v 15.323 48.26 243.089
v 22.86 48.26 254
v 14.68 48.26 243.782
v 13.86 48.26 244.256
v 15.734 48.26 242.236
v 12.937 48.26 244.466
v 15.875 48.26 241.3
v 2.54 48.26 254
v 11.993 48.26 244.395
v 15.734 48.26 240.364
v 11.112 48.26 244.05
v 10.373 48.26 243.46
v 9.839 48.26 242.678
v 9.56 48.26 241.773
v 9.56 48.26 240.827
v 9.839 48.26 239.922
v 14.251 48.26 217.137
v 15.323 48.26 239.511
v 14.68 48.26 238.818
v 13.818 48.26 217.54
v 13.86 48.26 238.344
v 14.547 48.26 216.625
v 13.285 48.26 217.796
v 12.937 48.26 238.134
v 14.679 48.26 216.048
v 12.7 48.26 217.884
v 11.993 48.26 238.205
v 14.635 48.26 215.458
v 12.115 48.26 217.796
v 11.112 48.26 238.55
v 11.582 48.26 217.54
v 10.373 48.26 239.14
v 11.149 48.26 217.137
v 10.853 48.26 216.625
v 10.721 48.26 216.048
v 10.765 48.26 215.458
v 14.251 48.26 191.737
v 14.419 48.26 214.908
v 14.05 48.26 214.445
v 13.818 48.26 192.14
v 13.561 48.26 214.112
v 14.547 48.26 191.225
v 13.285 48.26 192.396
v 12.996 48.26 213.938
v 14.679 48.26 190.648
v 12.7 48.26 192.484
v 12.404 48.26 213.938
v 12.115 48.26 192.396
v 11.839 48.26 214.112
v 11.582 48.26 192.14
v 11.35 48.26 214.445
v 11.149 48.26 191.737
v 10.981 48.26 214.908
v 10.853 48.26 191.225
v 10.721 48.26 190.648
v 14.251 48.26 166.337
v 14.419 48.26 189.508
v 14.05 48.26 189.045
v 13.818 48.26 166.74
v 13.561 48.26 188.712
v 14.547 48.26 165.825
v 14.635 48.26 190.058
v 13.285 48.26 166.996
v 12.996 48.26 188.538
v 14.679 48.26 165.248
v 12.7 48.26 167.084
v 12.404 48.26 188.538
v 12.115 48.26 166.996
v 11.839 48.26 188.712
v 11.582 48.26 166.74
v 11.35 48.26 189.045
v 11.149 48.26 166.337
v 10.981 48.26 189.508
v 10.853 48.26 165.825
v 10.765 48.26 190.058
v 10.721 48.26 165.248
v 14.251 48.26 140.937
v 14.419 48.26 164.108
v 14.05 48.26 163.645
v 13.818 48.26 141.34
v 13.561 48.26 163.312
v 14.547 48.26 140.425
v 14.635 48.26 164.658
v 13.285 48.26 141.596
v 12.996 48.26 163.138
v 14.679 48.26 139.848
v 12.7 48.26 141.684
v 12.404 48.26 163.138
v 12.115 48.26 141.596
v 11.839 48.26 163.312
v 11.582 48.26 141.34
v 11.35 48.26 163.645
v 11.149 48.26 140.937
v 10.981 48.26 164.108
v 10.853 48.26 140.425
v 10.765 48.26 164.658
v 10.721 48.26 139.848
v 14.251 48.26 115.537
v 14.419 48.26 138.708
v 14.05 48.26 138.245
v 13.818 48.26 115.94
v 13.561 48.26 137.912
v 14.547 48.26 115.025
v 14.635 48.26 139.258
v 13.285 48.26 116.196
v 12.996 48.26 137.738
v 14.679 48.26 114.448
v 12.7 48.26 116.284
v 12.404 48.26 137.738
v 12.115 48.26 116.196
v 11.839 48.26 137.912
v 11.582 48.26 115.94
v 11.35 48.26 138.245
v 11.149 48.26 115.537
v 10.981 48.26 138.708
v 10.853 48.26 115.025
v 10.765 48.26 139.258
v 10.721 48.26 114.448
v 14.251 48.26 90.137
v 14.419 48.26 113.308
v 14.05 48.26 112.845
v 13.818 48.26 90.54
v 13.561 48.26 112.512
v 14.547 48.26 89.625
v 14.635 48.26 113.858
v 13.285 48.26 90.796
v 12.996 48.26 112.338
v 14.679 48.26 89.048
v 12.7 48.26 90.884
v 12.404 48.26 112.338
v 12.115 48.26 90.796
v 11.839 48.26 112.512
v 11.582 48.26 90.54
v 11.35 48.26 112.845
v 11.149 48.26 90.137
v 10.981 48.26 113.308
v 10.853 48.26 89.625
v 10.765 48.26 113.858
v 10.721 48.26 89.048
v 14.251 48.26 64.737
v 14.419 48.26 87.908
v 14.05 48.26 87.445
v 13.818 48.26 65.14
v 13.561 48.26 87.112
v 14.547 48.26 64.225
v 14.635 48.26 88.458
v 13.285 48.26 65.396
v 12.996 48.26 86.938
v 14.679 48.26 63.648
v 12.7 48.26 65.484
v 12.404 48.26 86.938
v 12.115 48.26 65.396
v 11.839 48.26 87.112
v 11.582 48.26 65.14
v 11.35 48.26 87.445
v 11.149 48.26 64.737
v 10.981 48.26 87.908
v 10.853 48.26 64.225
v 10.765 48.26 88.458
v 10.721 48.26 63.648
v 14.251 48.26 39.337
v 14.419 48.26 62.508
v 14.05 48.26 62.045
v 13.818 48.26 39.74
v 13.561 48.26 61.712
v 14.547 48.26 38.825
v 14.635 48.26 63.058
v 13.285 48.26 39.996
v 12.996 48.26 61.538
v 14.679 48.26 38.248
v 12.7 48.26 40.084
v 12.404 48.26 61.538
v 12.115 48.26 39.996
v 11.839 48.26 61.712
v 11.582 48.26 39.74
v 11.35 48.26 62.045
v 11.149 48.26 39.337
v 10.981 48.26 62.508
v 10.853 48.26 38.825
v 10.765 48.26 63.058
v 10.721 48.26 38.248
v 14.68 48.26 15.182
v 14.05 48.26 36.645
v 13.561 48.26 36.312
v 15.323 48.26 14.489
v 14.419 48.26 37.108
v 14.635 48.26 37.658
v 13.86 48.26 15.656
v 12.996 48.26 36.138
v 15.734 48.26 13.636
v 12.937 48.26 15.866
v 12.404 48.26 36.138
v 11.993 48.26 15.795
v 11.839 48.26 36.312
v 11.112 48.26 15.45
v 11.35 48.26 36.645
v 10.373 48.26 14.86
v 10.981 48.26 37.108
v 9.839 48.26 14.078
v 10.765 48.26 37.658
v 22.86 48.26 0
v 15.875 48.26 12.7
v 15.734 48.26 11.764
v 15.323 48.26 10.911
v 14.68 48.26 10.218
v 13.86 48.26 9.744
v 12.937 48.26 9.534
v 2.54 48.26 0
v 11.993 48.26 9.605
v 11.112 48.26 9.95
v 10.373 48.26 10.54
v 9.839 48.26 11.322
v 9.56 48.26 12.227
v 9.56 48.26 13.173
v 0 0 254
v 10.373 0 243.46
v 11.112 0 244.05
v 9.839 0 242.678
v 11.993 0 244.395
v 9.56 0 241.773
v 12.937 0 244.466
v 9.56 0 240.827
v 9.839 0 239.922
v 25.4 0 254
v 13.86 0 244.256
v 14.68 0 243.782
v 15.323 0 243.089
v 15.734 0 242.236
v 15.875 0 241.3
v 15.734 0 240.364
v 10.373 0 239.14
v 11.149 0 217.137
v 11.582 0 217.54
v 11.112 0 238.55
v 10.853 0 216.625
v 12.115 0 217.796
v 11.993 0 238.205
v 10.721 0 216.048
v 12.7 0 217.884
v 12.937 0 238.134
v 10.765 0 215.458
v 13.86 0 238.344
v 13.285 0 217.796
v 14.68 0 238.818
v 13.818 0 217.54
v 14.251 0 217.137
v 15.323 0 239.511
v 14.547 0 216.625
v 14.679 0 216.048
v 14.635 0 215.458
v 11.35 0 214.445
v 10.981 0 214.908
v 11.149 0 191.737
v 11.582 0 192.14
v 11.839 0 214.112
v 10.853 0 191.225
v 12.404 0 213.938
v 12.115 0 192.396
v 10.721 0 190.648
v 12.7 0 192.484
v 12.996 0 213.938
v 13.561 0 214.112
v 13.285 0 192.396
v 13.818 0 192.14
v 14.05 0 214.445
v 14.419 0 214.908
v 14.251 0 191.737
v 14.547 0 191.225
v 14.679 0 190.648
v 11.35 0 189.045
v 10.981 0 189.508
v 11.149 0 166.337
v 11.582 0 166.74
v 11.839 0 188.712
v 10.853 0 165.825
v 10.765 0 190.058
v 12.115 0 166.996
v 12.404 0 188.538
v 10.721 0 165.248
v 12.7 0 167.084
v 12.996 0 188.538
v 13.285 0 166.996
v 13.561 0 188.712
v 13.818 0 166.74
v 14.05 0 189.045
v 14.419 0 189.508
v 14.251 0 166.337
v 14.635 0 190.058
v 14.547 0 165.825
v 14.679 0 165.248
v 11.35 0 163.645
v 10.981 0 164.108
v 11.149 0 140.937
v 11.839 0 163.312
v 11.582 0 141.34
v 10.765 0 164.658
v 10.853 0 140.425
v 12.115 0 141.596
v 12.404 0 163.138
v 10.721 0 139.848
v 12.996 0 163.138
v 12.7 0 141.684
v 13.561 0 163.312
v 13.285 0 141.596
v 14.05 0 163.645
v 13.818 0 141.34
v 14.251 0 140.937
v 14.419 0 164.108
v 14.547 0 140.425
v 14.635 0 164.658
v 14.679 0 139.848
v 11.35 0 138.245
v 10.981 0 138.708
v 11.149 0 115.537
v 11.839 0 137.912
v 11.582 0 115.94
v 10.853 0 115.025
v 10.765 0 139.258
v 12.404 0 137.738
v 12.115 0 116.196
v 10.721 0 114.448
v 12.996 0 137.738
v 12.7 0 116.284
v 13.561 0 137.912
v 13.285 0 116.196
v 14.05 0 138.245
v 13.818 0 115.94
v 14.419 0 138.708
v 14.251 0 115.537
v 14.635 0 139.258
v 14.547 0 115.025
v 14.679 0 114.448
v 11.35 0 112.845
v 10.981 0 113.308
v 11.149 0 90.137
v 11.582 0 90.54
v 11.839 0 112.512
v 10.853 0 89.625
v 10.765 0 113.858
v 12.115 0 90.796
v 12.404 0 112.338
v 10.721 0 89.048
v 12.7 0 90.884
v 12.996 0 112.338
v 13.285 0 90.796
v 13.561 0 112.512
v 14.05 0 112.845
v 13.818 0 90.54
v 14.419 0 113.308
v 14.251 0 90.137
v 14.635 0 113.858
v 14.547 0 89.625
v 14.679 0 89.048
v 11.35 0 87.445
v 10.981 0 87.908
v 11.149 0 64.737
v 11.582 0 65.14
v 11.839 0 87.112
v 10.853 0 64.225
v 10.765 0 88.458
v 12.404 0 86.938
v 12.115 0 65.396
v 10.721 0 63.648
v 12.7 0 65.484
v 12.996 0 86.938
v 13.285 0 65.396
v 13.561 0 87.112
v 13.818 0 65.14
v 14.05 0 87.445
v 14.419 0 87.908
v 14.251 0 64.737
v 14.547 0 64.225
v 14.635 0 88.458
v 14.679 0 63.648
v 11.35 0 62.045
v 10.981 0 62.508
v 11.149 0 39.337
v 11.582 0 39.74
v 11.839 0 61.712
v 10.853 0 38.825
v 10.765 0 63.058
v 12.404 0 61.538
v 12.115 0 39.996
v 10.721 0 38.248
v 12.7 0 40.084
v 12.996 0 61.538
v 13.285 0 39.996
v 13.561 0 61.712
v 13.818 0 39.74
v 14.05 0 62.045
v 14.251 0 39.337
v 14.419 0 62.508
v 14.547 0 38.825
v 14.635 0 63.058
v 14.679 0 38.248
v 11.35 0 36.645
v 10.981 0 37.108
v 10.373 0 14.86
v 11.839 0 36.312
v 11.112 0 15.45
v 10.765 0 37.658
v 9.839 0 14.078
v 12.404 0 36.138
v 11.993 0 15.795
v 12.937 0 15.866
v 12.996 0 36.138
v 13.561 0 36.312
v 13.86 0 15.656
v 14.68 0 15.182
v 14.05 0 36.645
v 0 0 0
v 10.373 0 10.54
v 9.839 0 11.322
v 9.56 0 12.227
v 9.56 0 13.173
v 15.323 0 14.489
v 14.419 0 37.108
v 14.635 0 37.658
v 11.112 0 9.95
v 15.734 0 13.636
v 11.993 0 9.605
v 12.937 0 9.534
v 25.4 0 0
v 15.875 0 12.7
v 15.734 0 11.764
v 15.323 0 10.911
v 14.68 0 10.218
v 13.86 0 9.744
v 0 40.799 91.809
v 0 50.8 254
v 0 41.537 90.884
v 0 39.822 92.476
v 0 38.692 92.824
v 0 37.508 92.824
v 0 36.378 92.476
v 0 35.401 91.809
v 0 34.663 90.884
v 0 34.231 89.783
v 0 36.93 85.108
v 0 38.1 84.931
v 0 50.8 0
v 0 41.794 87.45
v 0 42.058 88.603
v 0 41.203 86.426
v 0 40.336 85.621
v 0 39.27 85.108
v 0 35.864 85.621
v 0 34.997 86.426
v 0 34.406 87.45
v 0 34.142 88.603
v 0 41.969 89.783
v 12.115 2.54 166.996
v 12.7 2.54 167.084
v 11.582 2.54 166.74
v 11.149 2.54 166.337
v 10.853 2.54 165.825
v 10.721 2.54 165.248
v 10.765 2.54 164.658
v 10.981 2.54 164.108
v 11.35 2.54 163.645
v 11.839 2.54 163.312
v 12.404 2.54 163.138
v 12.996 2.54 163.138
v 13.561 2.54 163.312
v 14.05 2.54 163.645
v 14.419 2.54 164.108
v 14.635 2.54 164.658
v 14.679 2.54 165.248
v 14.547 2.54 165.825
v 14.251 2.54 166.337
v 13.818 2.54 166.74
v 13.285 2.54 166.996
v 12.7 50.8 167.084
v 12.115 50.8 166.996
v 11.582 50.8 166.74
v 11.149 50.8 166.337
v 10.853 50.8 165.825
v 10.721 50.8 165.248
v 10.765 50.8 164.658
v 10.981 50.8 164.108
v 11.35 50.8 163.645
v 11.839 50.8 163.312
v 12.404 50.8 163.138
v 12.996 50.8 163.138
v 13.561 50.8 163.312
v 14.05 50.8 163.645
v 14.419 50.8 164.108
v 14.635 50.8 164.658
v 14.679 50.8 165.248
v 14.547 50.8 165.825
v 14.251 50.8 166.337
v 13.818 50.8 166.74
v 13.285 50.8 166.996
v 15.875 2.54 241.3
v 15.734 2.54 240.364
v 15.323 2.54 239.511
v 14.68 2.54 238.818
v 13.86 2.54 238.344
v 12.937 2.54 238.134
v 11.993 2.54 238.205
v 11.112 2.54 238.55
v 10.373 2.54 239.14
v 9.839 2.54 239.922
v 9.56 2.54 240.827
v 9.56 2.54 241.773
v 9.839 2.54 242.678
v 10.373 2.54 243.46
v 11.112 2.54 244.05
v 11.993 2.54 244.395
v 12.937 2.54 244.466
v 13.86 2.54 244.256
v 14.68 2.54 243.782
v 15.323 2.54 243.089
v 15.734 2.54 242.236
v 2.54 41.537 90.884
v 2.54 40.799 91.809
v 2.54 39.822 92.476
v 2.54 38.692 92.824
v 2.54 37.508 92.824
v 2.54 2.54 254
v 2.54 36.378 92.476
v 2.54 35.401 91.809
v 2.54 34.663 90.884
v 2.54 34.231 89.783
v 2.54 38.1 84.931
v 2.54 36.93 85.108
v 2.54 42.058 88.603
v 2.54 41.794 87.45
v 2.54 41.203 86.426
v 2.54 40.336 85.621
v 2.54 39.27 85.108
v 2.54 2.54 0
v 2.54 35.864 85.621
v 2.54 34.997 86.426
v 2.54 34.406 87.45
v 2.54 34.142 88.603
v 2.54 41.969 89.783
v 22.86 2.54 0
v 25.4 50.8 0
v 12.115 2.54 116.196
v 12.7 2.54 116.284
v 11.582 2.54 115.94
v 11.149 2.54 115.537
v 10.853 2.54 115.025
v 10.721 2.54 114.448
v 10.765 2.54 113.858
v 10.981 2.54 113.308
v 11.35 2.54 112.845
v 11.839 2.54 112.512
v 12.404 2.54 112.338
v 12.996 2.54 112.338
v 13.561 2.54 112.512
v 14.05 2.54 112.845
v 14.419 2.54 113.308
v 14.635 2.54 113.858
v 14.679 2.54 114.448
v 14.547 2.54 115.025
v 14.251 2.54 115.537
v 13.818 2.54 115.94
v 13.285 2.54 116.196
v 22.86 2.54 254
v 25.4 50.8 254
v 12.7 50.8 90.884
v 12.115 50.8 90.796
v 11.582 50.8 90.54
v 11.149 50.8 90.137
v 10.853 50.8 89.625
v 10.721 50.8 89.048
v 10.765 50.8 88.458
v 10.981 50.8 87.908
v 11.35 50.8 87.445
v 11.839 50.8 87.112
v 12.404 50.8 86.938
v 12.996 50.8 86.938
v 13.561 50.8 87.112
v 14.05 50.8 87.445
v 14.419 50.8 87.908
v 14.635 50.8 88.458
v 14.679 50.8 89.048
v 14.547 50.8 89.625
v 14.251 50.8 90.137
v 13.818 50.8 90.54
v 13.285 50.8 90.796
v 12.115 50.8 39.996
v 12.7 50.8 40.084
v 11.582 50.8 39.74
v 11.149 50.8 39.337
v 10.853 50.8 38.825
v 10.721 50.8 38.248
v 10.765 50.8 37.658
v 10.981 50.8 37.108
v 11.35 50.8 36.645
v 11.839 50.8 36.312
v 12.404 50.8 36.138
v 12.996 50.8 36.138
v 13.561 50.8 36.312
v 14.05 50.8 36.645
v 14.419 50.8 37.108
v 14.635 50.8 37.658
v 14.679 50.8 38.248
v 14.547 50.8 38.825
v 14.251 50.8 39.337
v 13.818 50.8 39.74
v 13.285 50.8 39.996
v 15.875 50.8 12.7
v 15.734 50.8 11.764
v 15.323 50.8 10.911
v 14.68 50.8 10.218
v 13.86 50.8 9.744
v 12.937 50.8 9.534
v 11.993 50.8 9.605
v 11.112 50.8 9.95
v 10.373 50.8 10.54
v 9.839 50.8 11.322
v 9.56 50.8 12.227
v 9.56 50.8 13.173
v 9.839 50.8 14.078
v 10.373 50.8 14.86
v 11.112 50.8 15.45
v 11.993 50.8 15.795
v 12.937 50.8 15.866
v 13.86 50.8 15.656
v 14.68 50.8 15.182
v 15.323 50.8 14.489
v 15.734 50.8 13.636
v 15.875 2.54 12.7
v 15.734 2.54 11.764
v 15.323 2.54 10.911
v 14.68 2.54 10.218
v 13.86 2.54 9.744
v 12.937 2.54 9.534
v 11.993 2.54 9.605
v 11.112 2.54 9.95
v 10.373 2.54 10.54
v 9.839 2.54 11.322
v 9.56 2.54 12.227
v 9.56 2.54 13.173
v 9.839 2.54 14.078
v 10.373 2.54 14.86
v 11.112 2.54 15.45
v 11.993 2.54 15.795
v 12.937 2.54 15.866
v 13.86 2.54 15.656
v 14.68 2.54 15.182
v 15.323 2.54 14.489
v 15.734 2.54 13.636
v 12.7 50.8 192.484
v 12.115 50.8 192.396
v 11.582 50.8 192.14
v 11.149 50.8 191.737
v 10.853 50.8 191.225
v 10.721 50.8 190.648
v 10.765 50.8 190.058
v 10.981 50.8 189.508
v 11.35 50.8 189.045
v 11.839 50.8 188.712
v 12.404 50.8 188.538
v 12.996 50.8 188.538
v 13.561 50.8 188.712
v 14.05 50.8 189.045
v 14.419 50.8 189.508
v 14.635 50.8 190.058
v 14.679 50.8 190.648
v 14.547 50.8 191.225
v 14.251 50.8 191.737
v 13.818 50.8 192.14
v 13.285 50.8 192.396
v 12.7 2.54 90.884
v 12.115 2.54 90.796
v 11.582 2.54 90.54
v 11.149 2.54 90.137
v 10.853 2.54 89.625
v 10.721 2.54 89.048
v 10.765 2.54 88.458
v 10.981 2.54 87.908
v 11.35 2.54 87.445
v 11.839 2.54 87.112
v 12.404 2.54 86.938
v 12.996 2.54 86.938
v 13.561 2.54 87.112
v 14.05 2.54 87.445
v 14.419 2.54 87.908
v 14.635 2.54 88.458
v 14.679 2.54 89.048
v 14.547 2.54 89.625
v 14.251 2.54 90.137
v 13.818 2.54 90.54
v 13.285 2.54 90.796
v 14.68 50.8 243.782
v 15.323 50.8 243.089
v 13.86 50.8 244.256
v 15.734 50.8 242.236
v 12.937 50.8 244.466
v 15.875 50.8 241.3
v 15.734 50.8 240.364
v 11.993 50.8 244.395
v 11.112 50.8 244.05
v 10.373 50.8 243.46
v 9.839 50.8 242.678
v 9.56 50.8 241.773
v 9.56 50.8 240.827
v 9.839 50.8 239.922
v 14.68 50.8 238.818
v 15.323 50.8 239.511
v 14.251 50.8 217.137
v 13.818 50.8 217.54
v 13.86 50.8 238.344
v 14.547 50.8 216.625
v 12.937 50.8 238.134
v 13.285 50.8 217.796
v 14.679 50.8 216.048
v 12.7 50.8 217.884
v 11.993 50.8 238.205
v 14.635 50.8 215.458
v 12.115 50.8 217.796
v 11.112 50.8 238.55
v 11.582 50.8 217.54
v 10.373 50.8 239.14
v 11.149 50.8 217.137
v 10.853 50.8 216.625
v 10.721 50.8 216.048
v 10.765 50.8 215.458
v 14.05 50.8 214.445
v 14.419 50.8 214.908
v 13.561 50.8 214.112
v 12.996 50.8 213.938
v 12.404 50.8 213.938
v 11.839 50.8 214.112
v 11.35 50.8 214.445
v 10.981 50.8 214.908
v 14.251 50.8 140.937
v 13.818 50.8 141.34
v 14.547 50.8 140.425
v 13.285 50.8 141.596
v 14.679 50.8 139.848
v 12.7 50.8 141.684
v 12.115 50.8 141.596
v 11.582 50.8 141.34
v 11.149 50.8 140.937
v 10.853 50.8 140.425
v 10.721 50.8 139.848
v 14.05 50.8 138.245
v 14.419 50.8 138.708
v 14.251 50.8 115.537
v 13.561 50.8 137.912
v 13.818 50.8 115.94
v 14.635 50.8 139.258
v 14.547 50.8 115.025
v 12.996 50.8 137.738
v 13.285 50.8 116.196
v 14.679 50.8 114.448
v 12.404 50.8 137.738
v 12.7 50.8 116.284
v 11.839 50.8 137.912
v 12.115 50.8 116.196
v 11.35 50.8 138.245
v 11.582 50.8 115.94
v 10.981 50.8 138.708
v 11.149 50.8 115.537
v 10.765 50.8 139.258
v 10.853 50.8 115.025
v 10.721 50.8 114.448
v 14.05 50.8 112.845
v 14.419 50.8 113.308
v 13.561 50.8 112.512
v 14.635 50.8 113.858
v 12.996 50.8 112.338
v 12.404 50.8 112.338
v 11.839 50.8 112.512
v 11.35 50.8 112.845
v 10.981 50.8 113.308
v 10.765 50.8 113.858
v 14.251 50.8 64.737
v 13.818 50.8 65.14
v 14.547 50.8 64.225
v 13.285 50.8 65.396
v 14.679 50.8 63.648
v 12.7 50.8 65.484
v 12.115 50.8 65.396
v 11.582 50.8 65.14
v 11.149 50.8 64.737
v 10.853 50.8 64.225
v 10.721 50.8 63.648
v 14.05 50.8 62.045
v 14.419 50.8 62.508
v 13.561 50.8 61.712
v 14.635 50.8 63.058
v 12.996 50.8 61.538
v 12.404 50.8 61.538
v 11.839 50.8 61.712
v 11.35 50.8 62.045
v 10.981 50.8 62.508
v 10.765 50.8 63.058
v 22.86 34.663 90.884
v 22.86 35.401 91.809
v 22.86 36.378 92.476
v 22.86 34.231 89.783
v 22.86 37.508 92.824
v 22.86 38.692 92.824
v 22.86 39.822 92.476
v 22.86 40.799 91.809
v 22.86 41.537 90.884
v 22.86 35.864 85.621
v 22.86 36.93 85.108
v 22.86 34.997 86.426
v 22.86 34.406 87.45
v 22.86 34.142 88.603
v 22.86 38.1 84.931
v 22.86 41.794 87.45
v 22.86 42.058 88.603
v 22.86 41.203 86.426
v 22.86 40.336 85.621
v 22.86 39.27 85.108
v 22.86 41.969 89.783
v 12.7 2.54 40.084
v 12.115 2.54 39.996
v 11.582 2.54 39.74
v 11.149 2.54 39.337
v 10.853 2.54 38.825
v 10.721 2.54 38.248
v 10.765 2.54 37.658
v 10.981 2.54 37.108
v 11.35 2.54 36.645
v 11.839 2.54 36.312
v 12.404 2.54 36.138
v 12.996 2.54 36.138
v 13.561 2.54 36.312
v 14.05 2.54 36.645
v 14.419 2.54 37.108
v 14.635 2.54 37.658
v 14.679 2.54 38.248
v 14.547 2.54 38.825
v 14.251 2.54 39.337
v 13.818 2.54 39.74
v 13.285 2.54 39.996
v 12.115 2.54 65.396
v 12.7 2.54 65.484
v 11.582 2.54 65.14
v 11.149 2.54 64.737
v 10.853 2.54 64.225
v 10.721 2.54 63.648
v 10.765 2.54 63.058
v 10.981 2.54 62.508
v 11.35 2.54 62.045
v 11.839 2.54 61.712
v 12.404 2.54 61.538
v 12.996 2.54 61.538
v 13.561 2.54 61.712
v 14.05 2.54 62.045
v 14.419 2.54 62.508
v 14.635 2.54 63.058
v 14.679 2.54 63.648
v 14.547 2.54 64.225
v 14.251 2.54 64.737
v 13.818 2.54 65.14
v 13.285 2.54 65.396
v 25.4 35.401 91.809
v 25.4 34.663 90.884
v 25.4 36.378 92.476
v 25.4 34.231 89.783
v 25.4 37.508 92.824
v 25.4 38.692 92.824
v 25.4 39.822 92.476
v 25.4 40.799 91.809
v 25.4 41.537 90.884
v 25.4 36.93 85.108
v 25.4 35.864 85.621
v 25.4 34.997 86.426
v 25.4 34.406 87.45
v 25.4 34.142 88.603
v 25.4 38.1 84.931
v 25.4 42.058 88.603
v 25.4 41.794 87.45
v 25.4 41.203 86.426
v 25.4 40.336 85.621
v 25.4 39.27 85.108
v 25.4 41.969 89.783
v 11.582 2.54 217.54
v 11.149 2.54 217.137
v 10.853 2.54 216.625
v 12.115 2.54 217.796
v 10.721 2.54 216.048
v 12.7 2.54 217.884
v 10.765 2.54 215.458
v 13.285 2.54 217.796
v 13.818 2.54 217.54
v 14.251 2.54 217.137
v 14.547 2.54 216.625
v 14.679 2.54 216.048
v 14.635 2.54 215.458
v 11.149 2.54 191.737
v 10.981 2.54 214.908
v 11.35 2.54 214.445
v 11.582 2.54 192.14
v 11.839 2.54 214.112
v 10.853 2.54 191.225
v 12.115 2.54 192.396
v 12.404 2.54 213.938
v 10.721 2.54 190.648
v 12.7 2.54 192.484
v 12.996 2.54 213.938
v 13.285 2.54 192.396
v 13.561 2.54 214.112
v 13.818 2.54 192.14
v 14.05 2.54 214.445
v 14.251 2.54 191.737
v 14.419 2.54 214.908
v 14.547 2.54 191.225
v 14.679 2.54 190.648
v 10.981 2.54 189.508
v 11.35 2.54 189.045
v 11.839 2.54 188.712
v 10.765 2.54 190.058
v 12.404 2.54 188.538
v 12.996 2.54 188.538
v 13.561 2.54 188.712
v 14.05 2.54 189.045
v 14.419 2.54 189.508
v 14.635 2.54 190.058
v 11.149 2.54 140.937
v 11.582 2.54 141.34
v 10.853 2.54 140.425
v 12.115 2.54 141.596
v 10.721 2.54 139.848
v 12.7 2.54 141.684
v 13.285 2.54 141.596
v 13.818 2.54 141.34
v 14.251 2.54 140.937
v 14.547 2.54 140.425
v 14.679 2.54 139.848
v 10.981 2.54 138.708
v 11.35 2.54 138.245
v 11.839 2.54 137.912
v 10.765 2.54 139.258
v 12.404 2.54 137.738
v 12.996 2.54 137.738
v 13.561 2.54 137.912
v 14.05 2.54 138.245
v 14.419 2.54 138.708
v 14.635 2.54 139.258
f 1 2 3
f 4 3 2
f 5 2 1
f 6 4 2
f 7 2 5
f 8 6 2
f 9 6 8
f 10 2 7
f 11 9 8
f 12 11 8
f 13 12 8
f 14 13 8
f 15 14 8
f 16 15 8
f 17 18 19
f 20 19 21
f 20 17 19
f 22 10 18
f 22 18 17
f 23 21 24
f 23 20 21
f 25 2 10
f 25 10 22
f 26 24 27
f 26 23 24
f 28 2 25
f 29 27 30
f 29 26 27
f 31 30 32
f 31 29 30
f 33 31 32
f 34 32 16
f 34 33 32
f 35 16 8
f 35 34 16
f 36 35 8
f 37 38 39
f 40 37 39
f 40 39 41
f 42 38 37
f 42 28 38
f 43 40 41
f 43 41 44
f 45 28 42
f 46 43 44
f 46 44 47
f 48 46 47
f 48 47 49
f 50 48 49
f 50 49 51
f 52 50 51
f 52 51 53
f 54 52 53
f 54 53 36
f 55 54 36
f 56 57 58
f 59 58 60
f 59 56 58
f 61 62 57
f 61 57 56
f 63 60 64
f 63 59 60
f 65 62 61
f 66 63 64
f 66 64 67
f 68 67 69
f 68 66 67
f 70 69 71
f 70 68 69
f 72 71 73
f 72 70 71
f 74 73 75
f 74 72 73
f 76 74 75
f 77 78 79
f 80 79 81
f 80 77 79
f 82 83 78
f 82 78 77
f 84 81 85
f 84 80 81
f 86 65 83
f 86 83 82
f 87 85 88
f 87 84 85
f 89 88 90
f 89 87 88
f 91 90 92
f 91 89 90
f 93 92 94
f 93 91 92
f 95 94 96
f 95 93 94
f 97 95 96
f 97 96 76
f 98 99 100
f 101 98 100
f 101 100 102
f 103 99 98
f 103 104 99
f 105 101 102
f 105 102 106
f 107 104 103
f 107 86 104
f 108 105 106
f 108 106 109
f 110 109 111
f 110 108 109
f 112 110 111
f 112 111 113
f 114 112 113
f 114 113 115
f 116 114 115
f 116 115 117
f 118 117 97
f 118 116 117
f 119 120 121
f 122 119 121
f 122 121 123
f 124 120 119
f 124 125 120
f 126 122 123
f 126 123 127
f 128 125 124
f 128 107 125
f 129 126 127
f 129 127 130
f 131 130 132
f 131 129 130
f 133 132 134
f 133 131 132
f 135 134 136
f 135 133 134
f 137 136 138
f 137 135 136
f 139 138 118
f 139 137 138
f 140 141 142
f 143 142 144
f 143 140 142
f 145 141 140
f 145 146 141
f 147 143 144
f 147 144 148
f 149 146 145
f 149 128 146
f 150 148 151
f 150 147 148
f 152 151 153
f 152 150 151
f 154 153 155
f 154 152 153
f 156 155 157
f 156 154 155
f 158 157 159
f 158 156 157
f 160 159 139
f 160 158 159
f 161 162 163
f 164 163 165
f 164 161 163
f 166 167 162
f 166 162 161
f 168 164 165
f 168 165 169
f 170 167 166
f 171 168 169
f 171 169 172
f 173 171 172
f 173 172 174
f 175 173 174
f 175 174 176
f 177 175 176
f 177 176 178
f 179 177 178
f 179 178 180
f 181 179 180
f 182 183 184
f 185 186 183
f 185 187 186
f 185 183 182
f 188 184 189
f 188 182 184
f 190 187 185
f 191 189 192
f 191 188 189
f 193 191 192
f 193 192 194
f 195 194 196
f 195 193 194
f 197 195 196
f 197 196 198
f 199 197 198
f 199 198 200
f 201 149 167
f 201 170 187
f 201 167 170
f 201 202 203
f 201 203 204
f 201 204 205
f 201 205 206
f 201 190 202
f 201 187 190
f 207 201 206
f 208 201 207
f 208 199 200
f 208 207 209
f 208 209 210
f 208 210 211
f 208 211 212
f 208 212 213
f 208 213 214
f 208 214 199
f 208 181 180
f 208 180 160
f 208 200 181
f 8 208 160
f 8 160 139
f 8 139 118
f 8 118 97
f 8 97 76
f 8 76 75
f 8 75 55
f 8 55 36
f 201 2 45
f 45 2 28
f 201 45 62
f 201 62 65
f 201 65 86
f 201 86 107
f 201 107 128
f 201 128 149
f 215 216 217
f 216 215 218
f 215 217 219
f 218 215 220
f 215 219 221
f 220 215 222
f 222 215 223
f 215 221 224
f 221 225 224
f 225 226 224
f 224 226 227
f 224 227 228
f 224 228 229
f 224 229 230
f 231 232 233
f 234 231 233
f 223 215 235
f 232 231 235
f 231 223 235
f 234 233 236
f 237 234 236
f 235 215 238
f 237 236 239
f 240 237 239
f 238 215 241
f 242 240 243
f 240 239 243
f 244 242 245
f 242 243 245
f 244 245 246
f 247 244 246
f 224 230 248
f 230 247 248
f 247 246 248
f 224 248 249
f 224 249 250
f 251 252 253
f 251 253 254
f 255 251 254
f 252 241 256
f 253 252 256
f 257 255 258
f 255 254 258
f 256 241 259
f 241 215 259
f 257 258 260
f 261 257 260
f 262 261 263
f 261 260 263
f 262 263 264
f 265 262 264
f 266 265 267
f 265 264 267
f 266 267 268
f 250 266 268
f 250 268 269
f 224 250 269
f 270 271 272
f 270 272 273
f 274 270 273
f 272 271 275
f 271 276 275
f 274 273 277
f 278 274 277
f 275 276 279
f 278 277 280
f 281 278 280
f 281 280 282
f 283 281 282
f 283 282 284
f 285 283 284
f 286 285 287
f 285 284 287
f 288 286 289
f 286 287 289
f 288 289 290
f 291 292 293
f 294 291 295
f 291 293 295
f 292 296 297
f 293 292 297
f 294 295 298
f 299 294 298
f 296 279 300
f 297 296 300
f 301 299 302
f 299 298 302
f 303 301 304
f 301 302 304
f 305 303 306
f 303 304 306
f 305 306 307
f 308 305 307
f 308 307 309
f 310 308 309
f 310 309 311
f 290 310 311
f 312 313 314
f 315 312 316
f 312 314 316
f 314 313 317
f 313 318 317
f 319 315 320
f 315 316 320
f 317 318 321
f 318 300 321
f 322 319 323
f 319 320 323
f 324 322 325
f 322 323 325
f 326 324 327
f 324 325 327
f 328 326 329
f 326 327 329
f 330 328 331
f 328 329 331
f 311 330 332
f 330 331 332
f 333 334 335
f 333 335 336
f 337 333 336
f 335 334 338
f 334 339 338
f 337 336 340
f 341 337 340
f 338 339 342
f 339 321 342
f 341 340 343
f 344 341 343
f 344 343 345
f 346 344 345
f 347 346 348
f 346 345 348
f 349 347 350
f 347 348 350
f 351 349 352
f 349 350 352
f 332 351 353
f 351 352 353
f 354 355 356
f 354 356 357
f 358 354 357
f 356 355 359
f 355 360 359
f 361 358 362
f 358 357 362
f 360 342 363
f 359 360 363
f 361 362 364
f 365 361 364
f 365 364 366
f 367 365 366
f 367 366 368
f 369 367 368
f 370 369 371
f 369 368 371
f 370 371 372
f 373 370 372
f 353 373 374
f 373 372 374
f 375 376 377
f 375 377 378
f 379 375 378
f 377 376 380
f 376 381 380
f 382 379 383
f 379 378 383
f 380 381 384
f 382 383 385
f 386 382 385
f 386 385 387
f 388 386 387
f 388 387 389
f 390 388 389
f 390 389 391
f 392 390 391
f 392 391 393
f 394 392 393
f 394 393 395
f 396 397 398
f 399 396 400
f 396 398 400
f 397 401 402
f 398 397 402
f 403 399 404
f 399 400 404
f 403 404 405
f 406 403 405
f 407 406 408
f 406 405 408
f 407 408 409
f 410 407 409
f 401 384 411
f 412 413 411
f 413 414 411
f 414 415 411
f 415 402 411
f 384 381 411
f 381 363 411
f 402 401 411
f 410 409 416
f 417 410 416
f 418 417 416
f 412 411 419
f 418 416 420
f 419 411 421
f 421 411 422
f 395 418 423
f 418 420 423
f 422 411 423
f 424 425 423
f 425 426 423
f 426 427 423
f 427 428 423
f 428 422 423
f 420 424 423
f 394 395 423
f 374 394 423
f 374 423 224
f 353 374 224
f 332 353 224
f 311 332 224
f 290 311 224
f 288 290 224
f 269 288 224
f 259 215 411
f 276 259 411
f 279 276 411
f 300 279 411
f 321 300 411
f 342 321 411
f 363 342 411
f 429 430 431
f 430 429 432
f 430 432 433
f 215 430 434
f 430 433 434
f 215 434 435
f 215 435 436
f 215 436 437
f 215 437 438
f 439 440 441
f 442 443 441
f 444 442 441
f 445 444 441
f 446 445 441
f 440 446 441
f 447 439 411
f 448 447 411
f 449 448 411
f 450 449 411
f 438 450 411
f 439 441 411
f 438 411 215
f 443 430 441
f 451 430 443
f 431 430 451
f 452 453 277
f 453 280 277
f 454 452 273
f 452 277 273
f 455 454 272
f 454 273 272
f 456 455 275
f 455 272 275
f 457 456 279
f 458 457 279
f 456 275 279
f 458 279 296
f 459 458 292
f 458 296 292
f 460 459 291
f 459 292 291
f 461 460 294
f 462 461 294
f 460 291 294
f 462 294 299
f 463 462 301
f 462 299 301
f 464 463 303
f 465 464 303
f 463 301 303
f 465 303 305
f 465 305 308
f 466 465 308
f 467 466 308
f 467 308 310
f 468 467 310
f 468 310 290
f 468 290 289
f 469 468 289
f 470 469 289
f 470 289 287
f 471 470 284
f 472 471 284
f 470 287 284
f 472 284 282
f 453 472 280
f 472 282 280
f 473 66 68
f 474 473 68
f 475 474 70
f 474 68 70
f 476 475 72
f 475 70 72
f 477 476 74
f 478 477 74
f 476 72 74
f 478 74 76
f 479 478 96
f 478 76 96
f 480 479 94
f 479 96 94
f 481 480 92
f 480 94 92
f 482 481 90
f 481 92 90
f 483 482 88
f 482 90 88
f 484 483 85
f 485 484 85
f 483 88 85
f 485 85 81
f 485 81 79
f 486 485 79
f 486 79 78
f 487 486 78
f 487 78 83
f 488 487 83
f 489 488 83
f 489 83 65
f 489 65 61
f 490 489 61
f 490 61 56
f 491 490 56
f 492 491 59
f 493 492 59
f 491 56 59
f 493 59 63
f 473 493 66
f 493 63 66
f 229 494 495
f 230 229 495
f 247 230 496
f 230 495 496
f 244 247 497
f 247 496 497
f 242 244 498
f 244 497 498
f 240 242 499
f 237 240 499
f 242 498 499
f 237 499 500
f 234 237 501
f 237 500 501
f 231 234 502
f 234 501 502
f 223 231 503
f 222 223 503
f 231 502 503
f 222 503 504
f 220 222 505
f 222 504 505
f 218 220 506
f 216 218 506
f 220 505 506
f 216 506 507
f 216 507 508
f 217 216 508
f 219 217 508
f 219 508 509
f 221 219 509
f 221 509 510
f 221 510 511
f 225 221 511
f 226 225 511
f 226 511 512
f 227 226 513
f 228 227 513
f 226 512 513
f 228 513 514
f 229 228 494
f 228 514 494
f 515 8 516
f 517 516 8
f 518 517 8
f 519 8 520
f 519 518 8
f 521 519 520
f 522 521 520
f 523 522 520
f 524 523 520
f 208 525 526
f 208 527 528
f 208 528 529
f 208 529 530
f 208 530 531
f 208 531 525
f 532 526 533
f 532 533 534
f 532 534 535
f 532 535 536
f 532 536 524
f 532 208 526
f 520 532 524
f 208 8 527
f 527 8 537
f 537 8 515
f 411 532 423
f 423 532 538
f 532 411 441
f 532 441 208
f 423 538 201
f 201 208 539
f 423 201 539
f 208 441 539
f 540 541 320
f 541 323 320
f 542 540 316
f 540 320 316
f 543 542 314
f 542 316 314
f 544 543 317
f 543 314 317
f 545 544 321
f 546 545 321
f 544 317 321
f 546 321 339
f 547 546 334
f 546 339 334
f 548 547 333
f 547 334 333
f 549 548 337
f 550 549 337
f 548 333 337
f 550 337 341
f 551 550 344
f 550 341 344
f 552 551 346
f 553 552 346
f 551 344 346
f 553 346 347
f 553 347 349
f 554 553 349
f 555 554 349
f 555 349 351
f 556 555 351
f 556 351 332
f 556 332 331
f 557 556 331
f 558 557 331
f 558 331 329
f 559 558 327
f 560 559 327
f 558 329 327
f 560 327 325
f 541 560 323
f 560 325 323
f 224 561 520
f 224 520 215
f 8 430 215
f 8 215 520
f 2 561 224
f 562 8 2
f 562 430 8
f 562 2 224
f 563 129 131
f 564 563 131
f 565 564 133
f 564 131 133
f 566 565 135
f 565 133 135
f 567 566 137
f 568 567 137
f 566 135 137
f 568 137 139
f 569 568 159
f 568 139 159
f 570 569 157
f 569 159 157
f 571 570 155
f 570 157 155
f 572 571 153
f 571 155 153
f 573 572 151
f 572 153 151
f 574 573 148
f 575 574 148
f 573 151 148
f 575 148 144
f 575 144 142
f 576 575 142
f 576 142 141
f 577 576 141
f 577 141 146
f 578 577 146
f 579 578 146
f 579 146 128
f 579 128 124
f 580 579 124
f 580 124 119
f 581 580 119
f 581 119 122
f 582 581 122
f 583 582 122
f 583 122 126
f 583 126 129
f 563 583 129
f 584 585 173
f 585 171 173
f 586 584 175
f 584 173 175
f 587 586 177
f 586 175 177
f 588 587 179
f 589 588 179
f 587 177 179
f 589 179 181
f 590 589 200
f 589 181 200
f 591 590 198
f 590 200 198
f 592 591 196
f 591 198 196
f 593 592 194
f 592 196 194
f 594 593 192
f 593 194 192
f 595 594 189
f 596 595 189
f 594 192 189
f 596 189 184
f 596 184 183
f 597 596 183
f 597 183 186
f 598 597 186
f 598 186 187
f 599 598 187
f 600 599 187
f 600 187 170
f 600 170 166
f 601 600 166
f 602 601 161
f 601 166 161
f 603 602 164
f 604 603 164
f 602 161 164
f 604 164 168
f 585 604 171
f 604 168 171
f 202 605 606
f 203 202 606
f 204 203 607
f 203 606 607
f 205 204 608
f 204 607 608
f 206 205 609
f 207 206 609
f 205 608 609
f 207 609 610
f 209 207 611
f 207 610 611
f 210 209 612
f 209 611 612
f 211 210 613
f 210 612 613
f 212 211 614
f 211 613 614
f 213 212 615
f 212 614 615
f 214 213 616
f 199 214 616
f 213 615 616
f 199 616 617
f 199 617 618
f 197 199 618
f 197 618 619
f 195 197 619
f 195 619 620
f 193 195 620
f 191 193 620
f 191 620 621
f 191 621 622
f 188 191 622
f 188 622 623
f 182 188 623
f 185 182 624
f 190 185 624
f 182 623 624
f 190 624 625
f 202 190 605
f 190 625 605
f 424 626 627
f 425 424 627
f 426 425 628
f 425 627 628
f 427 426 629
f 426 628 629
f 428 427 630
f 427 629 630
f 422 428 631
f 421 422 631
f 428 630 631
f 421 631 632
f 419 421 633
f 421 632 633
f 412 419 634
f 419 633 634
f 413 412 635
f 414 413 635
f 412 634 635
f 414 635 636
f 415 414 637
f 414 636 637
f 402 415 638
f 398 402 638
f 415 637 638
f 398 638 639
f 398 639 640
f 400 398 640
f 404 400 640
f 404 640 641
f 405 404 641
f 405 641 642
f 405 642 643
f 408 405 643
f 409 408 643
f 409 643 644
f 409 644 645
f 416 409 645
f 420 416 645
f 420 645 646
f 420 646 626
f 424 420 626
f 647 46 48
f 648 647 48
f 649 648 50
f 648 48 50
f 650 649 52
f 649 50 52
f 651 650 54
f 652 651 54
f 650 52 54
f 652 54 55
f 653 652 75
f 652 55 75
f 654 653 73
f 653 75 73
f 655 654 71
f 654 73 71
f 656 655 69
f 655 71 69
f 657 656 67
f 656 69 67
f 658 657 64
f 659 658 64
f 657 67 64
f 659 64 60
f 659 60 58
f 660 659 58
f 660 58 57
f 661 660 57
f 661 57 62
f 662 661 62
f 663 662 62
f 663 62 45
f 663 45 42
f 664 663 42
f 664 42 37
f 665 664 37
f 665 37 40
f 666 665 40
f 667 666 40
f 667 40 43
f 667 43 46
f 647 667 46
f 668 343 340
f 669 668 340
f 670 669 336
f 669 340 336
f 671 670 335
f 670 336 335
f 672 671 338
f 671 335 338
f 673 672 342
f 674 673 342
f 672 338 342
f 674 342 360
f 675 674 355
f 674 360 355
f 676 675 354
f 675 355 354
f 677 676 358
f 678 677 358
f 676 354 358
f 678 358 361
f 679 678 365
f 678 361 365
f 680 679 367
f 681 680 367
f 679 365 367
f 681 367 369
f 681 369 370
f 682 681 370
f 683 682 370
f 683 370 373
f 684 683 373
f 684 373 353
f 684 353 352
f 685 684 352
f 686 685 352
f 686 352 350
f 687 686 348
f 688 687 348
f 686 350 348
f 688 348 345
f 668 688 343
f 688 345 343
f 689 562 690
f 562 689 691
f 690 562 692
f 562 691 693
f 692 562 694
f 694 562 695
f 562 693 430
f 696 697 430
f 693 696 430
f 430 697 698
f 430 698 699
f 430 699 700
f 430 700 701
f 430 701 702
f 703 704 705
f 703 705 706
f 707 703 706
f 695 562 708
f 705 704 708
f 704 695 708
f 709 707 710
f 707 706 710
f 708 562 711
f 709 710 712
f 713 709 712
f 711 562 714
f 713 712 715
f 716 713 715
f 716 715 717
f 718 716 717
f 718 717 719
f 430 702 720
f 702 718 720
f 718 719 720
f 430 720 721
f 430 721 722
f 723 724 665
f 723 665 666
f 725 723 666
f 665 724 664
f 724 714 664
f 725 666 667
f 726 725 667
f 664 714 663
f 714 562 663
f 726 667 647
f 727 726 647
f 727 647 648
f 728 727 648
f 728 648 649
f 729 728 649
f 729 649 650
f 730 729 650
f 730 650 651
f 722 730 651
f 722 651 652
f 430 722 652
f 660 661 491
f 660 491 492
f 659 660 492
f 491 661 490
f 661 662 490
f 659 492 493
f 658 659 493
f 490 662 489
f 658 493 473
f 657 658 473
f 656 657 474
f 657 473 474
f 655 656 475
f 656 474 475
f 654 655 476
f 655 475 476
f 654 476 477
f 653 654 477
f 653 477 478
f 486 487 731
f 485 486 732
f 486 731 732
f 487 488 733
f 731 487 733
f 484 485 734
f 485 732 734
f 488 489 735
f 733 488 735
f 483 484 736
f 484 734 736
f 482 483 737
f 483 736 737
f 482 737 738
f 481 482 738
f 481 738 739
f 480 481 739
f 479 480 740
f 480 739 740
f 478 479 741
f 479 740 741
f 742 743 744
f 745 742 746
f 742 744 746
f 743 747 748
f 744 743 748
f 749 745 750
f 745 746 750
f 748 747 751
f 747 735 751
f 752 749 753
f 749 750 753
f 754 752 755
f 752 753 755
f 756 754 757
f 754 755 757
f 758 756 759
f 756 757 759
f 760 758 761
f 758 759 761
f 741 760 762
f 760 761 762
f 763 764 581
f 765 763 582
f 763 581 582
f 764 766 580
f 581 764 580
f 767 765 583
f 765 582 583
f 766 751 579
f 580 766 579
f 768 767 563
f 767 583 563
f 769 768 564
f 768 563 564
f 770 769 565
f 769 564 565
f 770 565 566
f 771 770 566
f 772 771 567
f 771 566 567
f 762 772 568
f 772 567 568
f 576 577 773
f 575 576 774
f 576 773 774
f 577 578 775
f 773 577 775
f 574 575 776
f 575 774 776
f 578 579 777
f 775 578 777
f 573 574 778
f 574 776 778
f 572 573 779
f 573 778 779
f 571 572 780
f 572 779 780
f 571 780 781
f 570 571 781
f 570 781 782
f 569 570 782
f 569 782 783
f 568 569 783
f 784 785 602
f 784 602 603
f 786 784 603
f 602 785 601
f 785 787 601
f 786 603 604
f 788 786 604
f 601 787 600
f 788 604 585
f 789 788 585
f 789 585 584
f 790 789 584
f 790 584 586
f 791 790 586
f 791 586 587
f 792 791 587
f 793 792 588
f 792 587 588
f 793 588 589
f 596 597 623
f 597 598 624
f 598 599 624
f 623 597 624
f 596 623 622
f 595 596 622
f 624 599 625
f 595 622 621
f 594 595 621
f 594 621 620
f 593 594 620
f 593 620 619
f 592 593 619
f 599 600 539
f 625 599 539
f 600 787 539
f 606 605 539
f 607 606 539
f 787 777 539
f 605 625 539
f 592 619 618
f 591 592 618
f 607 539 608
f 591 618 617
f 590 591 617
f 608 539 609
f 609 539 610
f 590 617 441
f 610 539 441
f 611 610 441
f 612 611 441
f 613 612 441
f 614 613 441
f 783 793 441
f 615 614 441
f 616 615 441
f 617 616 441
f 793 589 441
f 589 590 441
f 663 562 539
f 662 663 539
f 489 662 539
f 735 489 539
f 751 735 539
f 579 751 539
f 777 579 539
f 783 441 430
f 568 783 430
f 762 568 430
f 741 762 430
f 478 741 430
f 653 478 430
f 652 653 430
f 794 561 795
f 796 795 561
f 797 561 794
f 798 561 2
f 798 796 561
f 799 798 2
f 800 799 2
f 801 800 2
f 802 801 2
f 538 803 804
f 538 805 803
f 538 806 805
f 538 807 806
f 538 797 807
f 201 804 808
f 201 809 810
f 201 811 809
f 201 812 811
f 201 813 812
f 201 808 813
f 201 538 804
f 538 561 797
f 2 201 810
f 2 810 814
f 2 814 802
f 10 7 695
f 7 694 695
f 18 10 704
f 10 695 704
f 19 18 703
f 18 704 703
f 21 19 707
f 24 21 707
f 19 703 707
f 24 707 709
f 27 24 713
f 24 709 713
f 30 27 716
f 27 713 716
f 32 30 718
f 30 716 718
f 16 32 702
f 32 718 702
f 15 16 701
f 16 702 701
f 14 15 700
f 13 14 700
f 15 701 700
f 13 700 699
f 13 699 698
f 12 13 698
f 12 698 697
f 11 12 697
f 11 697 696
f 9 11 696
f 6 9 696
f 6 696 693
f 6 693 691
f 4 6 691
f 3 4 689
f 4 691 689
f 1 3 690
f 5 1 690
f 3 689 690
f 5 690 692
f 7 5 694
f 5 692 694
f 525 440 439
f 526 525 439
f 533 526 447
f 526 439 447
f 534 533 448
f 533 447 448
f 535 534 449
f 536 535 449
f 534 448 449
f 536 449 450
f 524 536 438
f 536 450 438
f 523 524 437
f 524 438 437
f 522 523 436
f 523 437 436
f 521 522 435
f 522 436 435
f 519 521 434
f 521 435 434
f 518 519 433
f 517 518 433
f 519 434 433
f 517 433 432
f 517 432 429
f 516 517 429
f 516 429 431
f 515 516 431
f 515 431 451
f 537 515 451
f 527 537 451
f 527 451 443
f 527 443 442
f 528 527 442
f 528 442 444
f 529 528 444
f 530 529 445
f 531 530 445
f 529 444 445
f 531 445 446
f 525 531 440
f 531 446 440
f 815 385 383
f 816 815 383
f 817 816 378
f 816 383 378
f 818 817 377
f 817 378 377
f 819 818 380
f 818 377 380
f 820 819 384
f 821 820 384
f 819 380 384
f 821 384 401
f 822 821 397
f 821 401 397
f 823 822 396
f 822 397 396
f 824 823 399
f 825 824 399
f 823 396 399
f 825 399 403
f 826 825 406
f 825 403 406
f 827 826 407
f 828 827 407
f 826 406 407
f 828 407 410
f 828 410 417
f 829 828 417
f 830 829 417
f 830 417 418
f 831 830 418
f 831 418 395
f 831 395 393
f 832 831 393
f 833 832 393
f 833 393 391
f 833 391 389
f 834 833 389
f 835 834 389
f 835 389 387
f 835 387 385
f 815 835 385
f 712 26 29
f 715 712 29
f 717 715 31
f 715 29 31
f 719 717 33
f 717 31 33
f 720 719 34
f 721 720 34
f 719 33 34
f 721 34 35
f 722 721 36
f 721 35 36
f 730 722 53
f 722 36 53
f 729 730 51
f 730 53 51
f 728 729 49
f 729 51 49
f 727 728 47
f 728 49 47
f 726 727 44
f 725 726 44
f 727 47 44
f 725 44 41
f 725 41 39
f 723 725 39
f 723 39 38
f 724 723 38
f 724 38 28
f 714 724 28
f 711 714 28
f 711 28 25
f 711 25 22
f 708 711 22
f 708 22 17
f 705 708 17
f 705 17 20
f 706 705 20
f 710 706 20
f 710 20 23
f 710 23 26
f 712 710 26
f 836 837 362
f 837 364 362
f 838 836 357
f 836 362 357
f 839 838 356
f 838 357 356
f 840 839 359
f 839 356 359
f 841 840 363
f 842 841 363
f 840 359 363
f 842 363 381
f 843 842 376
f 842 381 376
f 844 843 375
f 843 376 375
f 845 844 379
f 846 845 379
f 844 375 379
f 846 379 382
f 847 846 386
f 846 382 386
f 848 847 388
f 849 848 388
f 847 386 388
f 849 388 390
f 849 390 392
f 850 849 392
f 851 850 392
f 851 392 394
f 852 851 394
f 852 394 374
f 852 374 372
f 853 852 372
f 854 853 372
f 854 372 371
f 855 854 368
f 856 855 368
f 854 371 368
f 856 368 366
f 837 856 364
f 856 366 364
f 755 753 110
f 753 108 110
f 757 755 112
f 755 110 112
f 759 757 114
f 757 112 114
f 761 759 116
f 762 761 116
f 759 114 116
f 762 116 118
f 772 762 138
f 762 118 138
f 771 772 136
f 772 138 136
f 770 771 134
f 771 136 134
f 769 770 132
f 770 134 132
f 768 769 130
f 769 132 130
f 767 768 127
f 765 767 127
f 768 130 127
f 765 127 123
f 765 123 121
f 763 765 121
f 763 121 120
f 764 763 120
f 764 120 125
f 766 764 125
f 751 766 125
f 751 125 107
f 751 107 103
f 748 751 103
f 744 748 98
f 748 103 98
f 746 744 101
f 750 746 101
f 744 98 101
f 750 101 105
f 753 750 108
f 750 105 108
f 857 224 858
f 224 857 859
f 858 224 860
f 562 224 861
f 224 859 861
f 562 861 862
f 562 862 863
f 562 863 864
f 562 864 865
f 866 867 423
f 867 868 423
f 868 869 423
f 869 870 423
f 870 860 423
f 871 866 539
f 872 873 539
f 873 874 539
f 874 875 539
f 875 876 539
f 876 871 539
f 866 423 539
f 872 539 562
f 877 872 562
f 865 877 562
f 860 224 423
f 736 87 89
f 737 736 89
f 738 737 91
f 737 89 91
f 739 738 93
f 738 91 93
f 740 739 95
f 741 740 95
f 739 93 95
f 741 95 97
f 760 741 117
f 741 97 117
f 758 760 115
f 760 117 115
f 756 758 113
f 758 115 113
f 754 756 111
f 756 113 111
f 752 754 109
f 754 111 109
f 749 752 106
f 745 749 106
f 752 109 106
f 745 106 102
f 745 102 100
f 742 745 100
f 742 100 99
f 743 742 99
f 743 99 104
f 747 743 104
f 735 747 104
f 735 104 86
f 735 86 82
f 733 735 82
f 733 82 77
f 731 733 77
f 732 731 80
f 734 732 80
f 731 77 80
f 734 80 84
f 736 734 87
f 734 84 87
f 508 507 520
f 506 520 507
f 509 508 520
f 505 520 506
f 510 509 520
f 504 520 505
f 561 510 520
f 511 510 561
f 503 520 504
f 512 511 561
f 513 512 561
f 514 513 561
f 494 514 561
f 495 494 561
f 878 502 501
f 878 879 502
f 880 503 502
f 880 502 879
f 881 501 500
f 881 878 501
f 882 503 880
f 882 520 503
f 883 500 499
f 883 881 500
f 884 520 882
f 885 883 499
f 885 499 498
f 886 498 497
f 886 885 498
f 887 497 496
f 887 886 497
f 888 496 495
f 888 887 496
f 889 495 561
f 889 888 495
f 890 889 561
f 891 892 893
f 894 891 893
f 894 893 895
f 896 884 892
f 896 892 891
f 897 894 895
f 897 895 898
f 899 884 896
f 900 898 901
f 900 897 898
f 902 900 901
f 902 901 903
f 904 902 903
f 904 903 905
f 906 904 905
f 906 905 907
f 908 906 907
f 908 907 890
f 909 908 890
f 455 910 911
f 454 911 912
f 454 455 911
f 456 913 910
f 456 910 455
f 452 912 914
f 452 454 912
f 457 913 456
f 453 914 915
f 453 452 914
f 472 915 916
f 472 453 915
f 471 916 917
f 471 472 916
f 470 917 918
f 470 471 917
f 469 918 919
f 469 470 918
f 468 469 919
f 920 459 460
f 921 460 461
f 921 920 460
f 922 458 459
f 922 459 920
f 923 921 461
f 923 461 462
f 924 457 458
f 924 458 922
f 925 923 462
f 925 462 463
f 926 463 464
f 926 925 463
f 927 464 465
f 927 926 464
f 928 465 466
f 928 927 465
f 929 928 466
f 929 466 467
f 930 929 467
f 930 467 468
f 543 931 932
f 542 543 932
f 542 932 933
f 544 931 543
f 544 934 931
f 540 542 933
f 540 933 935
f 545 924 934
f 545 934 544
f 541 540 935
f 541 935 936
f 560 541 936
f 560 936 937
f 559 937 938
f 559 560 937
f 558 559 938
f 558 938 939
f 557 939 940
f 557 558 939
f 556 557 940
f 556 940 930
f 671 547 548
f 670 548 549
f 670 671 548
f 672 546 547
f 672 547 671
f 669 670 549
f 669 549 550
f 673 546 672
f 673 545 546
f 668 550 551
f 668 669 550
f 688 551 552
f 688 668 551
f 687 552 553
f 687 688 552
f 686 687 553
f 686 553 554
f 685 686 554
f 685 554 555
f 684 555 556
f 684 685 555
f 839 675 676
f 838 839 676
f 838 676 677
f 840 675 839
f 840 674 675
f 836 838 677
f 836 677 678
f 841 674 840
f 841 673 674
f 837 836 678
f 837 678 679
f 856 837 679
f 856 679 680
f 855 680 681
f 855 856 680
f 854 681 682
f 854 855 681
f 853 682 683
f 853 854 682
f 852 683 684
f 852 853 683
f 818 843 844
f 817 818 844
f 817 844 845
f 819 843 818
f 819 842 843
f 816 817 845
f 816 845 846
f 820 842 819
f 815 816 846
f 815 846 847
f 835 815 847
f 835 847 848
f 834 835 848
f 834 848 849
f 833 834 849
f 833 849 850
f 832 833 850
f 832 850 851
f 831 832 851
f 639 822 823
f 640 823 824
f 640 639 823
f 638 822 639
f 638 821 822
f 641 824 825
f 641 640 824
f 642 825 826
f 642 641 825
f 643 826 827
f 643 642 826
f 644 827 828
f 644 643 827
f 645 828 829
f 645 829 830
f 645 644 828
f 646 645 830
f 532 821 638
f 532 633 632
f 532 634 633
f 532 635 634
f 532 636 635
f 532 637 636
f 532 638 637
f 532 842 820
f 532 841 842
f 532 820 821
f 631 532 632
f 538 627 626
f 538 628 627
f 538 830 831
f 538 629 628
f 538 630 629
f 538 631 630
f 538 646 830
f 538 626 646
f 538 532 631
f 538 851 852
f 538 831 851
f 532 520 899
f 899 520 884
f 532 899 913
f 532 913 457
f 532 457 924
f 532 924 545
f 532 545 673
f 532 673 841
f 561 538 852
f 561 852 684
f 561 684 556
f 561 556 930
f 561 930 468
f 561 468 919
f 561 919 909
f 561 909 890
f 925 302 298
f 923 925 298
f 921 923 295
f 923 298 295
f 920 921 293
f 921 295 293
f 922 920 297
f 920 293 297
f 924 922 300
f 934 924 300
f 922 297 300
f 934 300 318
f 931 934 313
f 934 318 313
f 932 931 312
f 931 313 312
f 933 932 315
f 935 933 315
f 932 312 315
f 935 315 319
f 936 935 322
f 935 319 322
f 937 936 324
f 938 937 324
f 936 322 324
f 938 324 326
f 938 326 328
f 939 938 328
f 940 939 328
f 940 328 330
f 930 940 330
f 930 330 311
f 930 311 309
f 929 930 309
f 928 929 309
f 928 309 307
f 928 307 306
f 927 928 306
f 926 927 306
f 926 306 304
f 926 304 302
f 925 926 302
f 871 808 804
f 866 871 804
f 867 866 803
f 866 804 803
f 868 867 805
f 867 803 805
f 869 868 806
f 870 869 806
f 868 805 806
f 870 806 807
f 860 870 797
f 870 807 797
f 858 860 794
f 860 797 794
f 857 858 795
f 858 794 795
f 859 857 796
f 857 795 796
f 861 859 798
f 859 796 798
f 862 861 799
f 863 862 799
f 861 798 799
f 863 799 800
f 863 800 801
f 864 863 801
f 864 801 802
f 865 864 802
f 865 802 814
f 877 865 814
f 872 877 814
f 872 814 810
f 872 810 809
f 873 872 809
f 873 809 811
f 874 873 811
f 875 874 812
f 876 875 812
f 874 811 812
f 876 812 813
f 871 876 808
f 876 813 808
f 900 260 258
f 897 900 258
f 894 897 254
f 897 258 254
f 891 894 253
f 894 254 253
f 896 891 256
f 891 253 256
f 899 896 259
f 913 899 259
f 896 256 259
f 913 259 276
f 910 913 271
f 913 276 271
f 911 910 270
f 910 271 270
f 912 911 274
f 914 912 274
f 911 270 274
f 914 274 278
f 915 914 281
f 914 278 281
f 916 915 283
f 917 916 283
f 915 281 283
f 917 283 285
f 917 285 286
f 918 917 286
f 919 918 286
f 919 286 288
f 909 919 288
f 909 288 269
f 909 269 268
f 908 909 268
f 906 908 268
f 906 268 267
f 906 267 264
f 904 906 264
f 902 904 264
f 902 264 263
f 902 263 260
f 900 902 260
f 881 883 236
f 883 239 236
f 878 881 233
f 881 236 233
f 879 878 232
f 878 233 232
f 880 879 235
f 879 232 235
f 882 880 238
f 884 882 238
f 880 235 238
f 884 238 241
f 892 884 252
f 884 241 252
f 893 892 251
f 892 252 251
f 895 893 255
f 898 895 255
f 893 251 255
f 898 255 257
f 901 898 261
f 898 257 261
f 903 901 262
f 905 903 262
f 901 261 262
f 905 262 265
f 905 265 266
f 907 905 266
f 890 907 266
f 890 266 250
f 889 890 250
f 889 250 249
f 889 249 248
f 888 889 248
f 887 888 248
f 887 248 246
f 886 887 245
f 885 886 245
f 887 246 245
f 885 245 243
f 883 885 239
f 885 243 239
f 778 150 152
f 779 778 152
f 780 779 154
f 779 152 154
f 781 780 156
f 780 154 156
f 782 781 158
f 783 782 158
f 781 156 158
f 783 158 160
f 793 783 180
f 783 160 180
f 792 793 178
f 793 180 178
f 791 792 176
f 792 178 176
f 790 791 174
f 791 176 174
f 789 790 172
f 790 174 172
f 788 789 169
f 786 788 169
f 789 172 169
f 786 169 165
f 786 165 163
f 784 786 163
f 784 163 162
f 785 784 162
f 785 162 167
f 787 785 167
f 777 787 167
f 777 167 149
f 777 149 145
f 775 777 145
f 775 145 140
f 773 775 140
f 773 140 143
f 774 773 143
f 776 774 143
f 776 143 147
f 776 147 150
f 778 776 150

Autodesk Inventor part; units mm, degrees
ref_plane "YZ Plane" through (0, 0, 0) normal (1, 0, 0) x (0, 1, 0)
ref_plane "XZ Plane" through (0, 0, 0) normal (0, 1, 0) x (-1, 0, 0)
ref_plane "XY Plane" through (0, 0, 0) normal (0, 0, 1) x (1, 0, 0)
sketch "Sketch1" plane through (0, 0, 0) normal (0, 0, 1) x (1, 0, 0)
  line L0 (0, 0) -> (25.4, 0)
  line L1 (25.4, 0) -> (25.4, 50.8)
  line L2 (25.4, 50.8) -> (0, 50.8)
  line L3 (0, 50.8) -> (0, 0)
  line L4 (2.54, 2.54) -> (22.86, 2.54)
  line L5 (22.86, 2.54) -> (22.86, 48.26)
  line L6 (22.86, 48.26) -> (2.54, 48.26)
  line L7 (2.54, 48.26) -> (2.54, 2.54)
  dimension "d0" = 25.4
  dimension "d1" = 50.8
  dimension "d2" = 20.32
  dimension "d3" = 45.72
  dimension "d4" = 2.54
  dimension "d5" = 2.54
extrude "Extrusion1" add sketch "Sketch1" along normal blind 254
sketch "Sketch2" plane through (0, 50.8, 0) normal (0, 1, 0) x (1, 0, 0)
  line L0 (25.4, 0) -> (0, 0) projected
  line L1 (0, 0) -> (0, -254) projected
  line L2 (25.4, -254) -> (0, -254) projected
  line L3 (25.4, 0) -> (25.4, -254) projected
  point P0 (12.7, -12.7)
  dimension "d8" = 12.7
  dimension "d9" = 12.7
hole "Hole1" at (12.7, 50.8, 12.7) direction (0, -1, 0) diameter 3.9688 end through all
pattern_linear "Rectangular Pattern1" count 10 spacing 25.4 along (0, 0, 1) of "Hole1"
sketch "Sketch3" plane through (0, 50.8, 0) normal (0, 1, 0) x (1, 0, 0)
  circle A0 centre (12.7, -241.3) radius 1.9844 projected
  circle A1 centre (12.7, -215.9) radius 1.9844 projected
  circle A2 centre (12.7, -190.5) radius 1.9844 projected
  circle A3 centre (12.7, -165.1) radius 1.9844 projected
  circle A4 centre (12.7, -139.7) radius 1.9844 projected
  circle A5 centre (12.7, -114.3) radius 1.9844 projected
  circle A6 centre (12.7, -88.9) radius 1.9844 projected
  circle A7 centre (12.7, -63.5) radius 1.9844 projected
  circle A8 centre (12.7, -38.1) radius 1.9844 projected
  circle A9 centre (12.7, -12.7) radius 1.9844 projected
  line L0 (25.4, 0) -> (0, 0) projected
  line L1 (0, 0) -> (0, -254) projected
  line L2 (25.4, -254) -> (0, -254) projected
  line L3 (25.4, 0) -> (25.4, -254) projected
  circle A10 centre (12.7, -12.7) radius 3.175
  circle A11 centre (12.7, -241.3) radius 3.175
  dimension "d20" = 6.35
  dimension "d21" = 6.35
extrude "Extrusion2" cut sketch "Sketch3" against normal blind 279.4 contours A0 | A9 | A10 | A11
sketch "Sketch4" plane through (25.4, 0, 0) normal (1, 0, 0) x (0, 0, -1)
  line L0 (0, 0) -> (0, 50.8) projected
  line L1 (0, 50.8) -> (-254, 50.8) projected
  line L2 (-254, 0) -> (-254, 50.8) projected
  line L3 (0, 0) -> (-254, 0) projected
  point P0 (-88.9, 38.1)
  dimension "d24" = 12.7
  dimension "d25" = 165.1
hole "Hole2" at (25.4, 38.1, 88.9) direction (-1, 0, 0) diameter 7.9375 end through all
properties part number "frame_side_bumper"
